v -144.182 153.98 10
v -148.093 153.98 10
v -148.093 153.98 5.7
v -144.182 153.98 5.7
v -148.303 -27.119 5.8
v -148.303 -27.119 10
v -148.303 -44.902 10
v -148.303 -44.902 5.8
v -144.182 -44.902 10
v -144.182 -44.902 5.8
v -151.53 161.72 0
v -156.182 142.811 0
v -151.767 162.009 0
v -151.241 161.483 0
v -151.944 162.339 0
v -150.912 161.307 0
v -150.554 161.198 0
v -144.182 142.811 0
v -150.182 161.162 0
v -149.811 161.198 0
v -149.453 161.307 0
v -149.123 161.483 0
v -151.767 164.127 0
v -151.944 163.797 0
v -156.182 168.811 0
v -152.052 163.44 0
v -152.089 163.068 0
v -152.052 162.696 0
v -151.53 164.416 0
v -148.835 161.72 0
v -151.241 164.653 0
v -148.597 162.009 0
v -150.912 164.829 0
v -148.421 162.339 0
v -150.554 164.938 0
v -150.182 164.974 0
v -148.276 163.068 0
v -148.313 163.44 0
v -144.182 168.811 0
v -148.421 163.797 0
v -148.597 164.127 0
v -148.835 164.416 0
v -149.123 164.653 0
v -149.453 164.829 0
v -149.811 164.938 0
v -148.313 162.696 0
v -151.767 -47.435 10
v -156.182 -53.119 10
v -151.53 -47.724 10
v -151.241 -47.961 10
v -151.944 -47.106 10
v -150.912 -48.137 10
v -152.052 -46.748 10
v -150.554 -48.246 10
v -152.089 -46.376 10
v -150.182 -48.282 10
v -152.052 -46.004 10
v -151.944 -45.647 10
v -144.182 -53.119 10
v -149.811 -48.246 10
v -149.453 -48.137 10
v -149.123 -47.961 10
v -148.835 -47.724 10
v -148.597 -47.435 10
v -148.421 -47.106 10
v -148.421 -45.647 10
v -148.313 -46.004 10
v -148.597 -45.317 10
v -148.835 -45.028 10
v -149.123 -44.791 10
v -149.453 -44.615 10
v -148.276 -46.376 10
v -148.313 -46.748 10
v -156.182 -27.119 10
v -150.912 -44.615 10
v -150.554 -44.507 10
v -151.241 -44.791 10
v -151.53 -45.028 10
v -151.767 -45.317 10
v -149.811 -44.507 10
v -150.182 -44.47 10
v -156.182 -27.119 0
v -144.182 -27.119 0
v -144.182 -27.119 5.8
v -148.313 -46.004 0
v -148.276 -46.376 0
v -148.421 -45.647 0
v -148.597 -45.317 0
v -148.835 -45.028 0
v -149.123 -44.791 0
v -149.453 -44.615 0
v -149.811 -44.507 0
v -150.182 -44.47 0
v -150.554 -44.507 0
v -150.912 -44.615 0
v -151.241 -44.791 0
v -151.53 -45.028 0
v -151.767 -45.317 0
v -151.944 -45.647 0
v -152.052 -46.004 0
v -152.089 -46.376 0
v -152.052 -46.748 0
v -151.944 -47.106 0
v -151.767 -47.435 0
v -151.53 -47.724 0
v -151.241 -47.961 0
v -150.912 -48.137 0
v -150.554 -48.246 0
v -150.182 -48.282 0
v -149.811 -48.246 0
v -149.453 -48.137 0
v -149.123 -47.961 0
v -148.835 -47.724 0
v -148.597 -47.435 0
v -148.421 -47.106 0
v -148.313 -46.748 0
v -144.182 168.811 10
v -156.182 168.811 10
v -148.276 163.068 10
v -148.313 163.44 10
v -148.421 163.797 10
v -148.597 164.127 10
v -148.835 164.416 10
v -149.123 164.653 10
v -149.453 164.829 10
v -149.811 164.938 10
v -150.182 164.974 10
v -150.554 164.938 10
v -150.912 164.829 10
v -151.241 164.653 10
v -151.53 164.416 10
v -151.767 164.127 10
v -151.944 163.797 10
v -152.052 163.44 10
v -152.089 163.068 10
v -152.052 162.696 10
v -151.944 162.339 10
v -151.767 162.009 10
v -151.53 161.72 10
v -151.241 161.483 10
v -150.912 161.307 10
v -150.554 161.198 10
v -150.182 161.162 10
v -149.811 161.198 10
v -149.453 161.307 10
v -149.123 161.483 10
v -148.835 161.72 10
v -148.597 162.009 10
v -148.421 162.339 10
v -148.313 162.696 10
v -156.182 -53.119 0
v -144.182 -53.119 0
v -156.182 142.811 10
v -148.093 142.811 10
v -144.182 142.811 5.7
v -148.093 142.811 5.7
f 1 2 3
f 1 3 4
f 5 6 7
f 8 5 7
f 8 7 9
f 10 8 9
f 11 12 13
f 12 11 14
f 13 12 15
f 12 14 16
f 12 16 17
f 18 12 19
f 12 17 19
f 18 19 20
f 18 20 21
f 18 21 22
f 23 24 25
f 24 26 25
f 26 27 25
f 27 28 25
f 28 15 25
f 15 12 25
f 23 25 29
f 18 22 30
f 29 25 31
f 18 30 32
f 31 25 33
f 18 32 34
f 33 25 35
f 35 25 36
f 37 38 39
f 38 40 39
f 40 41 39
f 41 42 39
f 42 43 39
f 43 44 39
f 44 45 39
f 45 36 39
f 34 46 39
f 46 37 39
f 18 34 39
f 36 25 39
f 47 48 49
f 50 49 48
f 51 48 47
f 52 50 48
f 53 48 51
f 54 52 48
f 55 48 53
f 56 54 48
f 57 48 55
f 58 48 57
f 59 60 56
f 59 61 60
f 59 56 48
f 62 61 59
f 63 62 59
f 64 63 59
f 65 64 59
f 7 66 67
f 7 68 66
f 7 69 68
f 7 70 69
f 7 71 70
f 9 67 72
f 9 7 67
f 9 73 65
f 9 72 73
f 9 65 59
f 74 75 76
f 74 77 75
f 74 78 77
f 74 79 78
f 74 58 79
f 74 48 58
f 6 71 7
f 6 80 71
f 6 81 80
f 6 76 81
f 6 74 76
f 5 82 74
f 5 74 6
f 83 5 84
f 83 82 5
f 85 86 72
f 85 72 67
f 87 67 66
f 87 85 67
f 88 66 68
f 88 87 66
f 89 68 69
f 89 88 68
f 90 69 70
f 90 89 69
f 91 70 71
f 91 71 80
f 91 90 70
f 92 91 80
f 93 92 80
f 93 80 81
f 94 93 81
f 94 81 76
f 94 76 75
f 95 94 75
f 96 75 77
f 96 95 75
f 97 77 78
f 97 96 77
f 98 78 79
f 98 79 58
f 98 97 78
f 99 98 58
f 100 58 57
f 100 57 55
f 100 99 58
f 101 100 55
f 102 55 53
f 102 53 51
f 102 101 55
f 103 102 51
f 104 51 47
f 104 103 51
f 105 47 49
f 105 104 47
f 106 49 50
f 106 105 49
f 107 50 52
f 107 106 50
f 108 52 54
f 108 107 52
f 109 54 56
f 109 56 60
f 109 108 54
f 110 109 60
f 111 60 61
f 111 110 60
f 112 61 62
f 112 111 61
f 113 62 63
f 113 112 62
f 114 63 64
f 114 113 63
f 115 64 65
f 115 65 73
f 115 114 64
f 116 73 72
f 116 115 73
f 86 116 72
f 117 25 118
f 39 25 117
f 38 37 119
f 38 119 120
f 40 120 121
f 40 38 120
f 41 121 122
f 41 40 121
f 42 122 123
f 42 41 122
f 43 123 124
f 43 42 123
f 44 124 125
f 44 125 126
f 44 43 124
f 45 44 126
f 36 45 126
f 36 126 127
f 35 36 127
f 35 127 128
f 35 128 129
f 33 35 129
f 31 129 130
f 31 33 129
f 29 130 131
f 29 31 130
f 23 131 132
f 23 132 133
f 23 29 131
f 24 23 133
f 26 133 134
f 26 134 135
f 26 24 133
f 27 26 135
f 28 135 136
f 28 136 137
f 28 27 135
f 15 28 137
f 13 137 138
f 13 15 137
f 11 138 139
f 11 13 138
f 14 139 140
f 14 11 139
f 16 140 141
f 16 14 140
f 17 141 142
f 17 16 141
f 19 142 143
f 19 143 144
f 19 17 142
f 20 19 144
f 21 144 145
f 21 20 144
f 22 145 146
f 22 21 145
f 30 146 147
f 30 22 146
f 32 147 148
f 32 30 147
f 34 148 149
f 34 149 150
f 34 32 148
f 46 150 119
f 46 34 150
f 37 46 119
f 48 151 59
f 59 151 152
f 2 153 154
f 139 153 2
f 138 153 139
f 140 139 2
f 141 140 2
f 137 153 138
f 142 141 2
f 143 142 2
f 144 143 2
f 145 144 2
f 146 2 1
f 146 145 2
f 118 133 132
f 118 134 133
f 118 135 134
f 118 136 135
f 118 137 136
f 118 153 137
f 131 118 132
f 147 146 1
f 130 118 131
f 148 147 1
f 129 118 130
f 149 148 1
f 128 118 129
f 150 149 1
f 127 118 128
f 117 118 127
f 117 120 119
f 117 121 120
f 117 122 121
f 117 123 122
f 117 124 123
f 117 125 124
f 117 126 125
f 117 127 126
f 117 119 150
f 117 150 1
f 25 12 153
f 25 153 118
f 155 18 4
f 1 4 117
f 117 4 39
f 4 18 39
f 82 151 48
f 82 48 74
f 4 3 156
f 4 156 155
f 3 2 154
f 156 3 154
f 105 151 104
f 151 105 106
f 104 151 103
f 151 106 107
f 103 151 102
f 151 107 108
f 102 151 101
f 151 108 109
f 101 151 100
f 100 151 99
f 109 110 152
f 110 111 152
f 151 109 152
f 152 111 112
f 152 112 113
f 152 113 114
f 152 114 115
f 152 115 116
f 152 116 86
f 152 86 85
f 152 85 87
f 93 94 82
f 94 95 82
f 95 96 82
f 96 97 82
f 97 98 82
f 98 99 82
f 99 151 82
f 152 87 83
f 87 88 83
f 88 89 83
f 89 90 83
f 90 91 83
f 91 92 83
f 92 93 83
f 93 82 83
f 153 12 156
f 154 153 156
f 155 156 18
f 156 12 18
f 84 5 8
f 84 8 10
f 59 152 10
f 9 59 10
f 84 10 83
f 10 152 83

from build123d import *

# Parameters (mm, degrees)
F0_W     = 12
F0_H     = 26
F0_R     = 1.906204
F1_DEPTH = 10
F2_W     = 3.91077
F2_H     = 11.169065
F3_DEPTH = 4.3
F5_DEPTH = 4.2


with BuildPart() as f1:
    # F0 (on Top) → F1 (new body)
    with BuildSketch(Plane.XY):
        with Locations((-150.182421, 155.81121)):
            Rectangle(F0_W, F0_H)
        with Locations((-150.182421, 163.068016)):
            Circle(F0_R, mode=Mode.SUBTRACT)
        with Locations((-150.182421, -40.119177)):
            Rectangle(F0_W, F0_H)
        with Locations((-150.182421, -46.376177)):
            Circle(F0_R, mode=Mode.SUBTRACT)
    extrude(amount=F1_DEPTH)

    # F2 (on face) → F3 (cut)
    with BuildSketch(Plane.XY.offset(10)):
        Polygon((-143.182421, 153.980275), (-144.182421, 153.980275), (-144.182421, 142.81121), (-148.093191, 142.81121), (-148.093191, 141.81121), (-143.182421, 141.81121), align=None)
        with Locations((-146.137806, 148.395742)):
            Rectangle(F2_W, F2_H)
    extrude(amount=-F3_DEPTH, mode=Mode.SUBTRACT)

    # F4 (on face) → F5 (cut)
    with BuildSketch(Plane.XY.offset(10)):
        Polygon((-142.428743, -25.942417), (-147.725043, -25.942417), (-148.303077, -25.942417), (-148.303077, -44.902083), (-147.725043, -44.902083), (-142.428743, -44.902083), (-142.428743, -43.325493), align=None)
    extrude(amount=-F5_DEPTH, mode=Mode.SUBTRACT)


solid = f1.part
